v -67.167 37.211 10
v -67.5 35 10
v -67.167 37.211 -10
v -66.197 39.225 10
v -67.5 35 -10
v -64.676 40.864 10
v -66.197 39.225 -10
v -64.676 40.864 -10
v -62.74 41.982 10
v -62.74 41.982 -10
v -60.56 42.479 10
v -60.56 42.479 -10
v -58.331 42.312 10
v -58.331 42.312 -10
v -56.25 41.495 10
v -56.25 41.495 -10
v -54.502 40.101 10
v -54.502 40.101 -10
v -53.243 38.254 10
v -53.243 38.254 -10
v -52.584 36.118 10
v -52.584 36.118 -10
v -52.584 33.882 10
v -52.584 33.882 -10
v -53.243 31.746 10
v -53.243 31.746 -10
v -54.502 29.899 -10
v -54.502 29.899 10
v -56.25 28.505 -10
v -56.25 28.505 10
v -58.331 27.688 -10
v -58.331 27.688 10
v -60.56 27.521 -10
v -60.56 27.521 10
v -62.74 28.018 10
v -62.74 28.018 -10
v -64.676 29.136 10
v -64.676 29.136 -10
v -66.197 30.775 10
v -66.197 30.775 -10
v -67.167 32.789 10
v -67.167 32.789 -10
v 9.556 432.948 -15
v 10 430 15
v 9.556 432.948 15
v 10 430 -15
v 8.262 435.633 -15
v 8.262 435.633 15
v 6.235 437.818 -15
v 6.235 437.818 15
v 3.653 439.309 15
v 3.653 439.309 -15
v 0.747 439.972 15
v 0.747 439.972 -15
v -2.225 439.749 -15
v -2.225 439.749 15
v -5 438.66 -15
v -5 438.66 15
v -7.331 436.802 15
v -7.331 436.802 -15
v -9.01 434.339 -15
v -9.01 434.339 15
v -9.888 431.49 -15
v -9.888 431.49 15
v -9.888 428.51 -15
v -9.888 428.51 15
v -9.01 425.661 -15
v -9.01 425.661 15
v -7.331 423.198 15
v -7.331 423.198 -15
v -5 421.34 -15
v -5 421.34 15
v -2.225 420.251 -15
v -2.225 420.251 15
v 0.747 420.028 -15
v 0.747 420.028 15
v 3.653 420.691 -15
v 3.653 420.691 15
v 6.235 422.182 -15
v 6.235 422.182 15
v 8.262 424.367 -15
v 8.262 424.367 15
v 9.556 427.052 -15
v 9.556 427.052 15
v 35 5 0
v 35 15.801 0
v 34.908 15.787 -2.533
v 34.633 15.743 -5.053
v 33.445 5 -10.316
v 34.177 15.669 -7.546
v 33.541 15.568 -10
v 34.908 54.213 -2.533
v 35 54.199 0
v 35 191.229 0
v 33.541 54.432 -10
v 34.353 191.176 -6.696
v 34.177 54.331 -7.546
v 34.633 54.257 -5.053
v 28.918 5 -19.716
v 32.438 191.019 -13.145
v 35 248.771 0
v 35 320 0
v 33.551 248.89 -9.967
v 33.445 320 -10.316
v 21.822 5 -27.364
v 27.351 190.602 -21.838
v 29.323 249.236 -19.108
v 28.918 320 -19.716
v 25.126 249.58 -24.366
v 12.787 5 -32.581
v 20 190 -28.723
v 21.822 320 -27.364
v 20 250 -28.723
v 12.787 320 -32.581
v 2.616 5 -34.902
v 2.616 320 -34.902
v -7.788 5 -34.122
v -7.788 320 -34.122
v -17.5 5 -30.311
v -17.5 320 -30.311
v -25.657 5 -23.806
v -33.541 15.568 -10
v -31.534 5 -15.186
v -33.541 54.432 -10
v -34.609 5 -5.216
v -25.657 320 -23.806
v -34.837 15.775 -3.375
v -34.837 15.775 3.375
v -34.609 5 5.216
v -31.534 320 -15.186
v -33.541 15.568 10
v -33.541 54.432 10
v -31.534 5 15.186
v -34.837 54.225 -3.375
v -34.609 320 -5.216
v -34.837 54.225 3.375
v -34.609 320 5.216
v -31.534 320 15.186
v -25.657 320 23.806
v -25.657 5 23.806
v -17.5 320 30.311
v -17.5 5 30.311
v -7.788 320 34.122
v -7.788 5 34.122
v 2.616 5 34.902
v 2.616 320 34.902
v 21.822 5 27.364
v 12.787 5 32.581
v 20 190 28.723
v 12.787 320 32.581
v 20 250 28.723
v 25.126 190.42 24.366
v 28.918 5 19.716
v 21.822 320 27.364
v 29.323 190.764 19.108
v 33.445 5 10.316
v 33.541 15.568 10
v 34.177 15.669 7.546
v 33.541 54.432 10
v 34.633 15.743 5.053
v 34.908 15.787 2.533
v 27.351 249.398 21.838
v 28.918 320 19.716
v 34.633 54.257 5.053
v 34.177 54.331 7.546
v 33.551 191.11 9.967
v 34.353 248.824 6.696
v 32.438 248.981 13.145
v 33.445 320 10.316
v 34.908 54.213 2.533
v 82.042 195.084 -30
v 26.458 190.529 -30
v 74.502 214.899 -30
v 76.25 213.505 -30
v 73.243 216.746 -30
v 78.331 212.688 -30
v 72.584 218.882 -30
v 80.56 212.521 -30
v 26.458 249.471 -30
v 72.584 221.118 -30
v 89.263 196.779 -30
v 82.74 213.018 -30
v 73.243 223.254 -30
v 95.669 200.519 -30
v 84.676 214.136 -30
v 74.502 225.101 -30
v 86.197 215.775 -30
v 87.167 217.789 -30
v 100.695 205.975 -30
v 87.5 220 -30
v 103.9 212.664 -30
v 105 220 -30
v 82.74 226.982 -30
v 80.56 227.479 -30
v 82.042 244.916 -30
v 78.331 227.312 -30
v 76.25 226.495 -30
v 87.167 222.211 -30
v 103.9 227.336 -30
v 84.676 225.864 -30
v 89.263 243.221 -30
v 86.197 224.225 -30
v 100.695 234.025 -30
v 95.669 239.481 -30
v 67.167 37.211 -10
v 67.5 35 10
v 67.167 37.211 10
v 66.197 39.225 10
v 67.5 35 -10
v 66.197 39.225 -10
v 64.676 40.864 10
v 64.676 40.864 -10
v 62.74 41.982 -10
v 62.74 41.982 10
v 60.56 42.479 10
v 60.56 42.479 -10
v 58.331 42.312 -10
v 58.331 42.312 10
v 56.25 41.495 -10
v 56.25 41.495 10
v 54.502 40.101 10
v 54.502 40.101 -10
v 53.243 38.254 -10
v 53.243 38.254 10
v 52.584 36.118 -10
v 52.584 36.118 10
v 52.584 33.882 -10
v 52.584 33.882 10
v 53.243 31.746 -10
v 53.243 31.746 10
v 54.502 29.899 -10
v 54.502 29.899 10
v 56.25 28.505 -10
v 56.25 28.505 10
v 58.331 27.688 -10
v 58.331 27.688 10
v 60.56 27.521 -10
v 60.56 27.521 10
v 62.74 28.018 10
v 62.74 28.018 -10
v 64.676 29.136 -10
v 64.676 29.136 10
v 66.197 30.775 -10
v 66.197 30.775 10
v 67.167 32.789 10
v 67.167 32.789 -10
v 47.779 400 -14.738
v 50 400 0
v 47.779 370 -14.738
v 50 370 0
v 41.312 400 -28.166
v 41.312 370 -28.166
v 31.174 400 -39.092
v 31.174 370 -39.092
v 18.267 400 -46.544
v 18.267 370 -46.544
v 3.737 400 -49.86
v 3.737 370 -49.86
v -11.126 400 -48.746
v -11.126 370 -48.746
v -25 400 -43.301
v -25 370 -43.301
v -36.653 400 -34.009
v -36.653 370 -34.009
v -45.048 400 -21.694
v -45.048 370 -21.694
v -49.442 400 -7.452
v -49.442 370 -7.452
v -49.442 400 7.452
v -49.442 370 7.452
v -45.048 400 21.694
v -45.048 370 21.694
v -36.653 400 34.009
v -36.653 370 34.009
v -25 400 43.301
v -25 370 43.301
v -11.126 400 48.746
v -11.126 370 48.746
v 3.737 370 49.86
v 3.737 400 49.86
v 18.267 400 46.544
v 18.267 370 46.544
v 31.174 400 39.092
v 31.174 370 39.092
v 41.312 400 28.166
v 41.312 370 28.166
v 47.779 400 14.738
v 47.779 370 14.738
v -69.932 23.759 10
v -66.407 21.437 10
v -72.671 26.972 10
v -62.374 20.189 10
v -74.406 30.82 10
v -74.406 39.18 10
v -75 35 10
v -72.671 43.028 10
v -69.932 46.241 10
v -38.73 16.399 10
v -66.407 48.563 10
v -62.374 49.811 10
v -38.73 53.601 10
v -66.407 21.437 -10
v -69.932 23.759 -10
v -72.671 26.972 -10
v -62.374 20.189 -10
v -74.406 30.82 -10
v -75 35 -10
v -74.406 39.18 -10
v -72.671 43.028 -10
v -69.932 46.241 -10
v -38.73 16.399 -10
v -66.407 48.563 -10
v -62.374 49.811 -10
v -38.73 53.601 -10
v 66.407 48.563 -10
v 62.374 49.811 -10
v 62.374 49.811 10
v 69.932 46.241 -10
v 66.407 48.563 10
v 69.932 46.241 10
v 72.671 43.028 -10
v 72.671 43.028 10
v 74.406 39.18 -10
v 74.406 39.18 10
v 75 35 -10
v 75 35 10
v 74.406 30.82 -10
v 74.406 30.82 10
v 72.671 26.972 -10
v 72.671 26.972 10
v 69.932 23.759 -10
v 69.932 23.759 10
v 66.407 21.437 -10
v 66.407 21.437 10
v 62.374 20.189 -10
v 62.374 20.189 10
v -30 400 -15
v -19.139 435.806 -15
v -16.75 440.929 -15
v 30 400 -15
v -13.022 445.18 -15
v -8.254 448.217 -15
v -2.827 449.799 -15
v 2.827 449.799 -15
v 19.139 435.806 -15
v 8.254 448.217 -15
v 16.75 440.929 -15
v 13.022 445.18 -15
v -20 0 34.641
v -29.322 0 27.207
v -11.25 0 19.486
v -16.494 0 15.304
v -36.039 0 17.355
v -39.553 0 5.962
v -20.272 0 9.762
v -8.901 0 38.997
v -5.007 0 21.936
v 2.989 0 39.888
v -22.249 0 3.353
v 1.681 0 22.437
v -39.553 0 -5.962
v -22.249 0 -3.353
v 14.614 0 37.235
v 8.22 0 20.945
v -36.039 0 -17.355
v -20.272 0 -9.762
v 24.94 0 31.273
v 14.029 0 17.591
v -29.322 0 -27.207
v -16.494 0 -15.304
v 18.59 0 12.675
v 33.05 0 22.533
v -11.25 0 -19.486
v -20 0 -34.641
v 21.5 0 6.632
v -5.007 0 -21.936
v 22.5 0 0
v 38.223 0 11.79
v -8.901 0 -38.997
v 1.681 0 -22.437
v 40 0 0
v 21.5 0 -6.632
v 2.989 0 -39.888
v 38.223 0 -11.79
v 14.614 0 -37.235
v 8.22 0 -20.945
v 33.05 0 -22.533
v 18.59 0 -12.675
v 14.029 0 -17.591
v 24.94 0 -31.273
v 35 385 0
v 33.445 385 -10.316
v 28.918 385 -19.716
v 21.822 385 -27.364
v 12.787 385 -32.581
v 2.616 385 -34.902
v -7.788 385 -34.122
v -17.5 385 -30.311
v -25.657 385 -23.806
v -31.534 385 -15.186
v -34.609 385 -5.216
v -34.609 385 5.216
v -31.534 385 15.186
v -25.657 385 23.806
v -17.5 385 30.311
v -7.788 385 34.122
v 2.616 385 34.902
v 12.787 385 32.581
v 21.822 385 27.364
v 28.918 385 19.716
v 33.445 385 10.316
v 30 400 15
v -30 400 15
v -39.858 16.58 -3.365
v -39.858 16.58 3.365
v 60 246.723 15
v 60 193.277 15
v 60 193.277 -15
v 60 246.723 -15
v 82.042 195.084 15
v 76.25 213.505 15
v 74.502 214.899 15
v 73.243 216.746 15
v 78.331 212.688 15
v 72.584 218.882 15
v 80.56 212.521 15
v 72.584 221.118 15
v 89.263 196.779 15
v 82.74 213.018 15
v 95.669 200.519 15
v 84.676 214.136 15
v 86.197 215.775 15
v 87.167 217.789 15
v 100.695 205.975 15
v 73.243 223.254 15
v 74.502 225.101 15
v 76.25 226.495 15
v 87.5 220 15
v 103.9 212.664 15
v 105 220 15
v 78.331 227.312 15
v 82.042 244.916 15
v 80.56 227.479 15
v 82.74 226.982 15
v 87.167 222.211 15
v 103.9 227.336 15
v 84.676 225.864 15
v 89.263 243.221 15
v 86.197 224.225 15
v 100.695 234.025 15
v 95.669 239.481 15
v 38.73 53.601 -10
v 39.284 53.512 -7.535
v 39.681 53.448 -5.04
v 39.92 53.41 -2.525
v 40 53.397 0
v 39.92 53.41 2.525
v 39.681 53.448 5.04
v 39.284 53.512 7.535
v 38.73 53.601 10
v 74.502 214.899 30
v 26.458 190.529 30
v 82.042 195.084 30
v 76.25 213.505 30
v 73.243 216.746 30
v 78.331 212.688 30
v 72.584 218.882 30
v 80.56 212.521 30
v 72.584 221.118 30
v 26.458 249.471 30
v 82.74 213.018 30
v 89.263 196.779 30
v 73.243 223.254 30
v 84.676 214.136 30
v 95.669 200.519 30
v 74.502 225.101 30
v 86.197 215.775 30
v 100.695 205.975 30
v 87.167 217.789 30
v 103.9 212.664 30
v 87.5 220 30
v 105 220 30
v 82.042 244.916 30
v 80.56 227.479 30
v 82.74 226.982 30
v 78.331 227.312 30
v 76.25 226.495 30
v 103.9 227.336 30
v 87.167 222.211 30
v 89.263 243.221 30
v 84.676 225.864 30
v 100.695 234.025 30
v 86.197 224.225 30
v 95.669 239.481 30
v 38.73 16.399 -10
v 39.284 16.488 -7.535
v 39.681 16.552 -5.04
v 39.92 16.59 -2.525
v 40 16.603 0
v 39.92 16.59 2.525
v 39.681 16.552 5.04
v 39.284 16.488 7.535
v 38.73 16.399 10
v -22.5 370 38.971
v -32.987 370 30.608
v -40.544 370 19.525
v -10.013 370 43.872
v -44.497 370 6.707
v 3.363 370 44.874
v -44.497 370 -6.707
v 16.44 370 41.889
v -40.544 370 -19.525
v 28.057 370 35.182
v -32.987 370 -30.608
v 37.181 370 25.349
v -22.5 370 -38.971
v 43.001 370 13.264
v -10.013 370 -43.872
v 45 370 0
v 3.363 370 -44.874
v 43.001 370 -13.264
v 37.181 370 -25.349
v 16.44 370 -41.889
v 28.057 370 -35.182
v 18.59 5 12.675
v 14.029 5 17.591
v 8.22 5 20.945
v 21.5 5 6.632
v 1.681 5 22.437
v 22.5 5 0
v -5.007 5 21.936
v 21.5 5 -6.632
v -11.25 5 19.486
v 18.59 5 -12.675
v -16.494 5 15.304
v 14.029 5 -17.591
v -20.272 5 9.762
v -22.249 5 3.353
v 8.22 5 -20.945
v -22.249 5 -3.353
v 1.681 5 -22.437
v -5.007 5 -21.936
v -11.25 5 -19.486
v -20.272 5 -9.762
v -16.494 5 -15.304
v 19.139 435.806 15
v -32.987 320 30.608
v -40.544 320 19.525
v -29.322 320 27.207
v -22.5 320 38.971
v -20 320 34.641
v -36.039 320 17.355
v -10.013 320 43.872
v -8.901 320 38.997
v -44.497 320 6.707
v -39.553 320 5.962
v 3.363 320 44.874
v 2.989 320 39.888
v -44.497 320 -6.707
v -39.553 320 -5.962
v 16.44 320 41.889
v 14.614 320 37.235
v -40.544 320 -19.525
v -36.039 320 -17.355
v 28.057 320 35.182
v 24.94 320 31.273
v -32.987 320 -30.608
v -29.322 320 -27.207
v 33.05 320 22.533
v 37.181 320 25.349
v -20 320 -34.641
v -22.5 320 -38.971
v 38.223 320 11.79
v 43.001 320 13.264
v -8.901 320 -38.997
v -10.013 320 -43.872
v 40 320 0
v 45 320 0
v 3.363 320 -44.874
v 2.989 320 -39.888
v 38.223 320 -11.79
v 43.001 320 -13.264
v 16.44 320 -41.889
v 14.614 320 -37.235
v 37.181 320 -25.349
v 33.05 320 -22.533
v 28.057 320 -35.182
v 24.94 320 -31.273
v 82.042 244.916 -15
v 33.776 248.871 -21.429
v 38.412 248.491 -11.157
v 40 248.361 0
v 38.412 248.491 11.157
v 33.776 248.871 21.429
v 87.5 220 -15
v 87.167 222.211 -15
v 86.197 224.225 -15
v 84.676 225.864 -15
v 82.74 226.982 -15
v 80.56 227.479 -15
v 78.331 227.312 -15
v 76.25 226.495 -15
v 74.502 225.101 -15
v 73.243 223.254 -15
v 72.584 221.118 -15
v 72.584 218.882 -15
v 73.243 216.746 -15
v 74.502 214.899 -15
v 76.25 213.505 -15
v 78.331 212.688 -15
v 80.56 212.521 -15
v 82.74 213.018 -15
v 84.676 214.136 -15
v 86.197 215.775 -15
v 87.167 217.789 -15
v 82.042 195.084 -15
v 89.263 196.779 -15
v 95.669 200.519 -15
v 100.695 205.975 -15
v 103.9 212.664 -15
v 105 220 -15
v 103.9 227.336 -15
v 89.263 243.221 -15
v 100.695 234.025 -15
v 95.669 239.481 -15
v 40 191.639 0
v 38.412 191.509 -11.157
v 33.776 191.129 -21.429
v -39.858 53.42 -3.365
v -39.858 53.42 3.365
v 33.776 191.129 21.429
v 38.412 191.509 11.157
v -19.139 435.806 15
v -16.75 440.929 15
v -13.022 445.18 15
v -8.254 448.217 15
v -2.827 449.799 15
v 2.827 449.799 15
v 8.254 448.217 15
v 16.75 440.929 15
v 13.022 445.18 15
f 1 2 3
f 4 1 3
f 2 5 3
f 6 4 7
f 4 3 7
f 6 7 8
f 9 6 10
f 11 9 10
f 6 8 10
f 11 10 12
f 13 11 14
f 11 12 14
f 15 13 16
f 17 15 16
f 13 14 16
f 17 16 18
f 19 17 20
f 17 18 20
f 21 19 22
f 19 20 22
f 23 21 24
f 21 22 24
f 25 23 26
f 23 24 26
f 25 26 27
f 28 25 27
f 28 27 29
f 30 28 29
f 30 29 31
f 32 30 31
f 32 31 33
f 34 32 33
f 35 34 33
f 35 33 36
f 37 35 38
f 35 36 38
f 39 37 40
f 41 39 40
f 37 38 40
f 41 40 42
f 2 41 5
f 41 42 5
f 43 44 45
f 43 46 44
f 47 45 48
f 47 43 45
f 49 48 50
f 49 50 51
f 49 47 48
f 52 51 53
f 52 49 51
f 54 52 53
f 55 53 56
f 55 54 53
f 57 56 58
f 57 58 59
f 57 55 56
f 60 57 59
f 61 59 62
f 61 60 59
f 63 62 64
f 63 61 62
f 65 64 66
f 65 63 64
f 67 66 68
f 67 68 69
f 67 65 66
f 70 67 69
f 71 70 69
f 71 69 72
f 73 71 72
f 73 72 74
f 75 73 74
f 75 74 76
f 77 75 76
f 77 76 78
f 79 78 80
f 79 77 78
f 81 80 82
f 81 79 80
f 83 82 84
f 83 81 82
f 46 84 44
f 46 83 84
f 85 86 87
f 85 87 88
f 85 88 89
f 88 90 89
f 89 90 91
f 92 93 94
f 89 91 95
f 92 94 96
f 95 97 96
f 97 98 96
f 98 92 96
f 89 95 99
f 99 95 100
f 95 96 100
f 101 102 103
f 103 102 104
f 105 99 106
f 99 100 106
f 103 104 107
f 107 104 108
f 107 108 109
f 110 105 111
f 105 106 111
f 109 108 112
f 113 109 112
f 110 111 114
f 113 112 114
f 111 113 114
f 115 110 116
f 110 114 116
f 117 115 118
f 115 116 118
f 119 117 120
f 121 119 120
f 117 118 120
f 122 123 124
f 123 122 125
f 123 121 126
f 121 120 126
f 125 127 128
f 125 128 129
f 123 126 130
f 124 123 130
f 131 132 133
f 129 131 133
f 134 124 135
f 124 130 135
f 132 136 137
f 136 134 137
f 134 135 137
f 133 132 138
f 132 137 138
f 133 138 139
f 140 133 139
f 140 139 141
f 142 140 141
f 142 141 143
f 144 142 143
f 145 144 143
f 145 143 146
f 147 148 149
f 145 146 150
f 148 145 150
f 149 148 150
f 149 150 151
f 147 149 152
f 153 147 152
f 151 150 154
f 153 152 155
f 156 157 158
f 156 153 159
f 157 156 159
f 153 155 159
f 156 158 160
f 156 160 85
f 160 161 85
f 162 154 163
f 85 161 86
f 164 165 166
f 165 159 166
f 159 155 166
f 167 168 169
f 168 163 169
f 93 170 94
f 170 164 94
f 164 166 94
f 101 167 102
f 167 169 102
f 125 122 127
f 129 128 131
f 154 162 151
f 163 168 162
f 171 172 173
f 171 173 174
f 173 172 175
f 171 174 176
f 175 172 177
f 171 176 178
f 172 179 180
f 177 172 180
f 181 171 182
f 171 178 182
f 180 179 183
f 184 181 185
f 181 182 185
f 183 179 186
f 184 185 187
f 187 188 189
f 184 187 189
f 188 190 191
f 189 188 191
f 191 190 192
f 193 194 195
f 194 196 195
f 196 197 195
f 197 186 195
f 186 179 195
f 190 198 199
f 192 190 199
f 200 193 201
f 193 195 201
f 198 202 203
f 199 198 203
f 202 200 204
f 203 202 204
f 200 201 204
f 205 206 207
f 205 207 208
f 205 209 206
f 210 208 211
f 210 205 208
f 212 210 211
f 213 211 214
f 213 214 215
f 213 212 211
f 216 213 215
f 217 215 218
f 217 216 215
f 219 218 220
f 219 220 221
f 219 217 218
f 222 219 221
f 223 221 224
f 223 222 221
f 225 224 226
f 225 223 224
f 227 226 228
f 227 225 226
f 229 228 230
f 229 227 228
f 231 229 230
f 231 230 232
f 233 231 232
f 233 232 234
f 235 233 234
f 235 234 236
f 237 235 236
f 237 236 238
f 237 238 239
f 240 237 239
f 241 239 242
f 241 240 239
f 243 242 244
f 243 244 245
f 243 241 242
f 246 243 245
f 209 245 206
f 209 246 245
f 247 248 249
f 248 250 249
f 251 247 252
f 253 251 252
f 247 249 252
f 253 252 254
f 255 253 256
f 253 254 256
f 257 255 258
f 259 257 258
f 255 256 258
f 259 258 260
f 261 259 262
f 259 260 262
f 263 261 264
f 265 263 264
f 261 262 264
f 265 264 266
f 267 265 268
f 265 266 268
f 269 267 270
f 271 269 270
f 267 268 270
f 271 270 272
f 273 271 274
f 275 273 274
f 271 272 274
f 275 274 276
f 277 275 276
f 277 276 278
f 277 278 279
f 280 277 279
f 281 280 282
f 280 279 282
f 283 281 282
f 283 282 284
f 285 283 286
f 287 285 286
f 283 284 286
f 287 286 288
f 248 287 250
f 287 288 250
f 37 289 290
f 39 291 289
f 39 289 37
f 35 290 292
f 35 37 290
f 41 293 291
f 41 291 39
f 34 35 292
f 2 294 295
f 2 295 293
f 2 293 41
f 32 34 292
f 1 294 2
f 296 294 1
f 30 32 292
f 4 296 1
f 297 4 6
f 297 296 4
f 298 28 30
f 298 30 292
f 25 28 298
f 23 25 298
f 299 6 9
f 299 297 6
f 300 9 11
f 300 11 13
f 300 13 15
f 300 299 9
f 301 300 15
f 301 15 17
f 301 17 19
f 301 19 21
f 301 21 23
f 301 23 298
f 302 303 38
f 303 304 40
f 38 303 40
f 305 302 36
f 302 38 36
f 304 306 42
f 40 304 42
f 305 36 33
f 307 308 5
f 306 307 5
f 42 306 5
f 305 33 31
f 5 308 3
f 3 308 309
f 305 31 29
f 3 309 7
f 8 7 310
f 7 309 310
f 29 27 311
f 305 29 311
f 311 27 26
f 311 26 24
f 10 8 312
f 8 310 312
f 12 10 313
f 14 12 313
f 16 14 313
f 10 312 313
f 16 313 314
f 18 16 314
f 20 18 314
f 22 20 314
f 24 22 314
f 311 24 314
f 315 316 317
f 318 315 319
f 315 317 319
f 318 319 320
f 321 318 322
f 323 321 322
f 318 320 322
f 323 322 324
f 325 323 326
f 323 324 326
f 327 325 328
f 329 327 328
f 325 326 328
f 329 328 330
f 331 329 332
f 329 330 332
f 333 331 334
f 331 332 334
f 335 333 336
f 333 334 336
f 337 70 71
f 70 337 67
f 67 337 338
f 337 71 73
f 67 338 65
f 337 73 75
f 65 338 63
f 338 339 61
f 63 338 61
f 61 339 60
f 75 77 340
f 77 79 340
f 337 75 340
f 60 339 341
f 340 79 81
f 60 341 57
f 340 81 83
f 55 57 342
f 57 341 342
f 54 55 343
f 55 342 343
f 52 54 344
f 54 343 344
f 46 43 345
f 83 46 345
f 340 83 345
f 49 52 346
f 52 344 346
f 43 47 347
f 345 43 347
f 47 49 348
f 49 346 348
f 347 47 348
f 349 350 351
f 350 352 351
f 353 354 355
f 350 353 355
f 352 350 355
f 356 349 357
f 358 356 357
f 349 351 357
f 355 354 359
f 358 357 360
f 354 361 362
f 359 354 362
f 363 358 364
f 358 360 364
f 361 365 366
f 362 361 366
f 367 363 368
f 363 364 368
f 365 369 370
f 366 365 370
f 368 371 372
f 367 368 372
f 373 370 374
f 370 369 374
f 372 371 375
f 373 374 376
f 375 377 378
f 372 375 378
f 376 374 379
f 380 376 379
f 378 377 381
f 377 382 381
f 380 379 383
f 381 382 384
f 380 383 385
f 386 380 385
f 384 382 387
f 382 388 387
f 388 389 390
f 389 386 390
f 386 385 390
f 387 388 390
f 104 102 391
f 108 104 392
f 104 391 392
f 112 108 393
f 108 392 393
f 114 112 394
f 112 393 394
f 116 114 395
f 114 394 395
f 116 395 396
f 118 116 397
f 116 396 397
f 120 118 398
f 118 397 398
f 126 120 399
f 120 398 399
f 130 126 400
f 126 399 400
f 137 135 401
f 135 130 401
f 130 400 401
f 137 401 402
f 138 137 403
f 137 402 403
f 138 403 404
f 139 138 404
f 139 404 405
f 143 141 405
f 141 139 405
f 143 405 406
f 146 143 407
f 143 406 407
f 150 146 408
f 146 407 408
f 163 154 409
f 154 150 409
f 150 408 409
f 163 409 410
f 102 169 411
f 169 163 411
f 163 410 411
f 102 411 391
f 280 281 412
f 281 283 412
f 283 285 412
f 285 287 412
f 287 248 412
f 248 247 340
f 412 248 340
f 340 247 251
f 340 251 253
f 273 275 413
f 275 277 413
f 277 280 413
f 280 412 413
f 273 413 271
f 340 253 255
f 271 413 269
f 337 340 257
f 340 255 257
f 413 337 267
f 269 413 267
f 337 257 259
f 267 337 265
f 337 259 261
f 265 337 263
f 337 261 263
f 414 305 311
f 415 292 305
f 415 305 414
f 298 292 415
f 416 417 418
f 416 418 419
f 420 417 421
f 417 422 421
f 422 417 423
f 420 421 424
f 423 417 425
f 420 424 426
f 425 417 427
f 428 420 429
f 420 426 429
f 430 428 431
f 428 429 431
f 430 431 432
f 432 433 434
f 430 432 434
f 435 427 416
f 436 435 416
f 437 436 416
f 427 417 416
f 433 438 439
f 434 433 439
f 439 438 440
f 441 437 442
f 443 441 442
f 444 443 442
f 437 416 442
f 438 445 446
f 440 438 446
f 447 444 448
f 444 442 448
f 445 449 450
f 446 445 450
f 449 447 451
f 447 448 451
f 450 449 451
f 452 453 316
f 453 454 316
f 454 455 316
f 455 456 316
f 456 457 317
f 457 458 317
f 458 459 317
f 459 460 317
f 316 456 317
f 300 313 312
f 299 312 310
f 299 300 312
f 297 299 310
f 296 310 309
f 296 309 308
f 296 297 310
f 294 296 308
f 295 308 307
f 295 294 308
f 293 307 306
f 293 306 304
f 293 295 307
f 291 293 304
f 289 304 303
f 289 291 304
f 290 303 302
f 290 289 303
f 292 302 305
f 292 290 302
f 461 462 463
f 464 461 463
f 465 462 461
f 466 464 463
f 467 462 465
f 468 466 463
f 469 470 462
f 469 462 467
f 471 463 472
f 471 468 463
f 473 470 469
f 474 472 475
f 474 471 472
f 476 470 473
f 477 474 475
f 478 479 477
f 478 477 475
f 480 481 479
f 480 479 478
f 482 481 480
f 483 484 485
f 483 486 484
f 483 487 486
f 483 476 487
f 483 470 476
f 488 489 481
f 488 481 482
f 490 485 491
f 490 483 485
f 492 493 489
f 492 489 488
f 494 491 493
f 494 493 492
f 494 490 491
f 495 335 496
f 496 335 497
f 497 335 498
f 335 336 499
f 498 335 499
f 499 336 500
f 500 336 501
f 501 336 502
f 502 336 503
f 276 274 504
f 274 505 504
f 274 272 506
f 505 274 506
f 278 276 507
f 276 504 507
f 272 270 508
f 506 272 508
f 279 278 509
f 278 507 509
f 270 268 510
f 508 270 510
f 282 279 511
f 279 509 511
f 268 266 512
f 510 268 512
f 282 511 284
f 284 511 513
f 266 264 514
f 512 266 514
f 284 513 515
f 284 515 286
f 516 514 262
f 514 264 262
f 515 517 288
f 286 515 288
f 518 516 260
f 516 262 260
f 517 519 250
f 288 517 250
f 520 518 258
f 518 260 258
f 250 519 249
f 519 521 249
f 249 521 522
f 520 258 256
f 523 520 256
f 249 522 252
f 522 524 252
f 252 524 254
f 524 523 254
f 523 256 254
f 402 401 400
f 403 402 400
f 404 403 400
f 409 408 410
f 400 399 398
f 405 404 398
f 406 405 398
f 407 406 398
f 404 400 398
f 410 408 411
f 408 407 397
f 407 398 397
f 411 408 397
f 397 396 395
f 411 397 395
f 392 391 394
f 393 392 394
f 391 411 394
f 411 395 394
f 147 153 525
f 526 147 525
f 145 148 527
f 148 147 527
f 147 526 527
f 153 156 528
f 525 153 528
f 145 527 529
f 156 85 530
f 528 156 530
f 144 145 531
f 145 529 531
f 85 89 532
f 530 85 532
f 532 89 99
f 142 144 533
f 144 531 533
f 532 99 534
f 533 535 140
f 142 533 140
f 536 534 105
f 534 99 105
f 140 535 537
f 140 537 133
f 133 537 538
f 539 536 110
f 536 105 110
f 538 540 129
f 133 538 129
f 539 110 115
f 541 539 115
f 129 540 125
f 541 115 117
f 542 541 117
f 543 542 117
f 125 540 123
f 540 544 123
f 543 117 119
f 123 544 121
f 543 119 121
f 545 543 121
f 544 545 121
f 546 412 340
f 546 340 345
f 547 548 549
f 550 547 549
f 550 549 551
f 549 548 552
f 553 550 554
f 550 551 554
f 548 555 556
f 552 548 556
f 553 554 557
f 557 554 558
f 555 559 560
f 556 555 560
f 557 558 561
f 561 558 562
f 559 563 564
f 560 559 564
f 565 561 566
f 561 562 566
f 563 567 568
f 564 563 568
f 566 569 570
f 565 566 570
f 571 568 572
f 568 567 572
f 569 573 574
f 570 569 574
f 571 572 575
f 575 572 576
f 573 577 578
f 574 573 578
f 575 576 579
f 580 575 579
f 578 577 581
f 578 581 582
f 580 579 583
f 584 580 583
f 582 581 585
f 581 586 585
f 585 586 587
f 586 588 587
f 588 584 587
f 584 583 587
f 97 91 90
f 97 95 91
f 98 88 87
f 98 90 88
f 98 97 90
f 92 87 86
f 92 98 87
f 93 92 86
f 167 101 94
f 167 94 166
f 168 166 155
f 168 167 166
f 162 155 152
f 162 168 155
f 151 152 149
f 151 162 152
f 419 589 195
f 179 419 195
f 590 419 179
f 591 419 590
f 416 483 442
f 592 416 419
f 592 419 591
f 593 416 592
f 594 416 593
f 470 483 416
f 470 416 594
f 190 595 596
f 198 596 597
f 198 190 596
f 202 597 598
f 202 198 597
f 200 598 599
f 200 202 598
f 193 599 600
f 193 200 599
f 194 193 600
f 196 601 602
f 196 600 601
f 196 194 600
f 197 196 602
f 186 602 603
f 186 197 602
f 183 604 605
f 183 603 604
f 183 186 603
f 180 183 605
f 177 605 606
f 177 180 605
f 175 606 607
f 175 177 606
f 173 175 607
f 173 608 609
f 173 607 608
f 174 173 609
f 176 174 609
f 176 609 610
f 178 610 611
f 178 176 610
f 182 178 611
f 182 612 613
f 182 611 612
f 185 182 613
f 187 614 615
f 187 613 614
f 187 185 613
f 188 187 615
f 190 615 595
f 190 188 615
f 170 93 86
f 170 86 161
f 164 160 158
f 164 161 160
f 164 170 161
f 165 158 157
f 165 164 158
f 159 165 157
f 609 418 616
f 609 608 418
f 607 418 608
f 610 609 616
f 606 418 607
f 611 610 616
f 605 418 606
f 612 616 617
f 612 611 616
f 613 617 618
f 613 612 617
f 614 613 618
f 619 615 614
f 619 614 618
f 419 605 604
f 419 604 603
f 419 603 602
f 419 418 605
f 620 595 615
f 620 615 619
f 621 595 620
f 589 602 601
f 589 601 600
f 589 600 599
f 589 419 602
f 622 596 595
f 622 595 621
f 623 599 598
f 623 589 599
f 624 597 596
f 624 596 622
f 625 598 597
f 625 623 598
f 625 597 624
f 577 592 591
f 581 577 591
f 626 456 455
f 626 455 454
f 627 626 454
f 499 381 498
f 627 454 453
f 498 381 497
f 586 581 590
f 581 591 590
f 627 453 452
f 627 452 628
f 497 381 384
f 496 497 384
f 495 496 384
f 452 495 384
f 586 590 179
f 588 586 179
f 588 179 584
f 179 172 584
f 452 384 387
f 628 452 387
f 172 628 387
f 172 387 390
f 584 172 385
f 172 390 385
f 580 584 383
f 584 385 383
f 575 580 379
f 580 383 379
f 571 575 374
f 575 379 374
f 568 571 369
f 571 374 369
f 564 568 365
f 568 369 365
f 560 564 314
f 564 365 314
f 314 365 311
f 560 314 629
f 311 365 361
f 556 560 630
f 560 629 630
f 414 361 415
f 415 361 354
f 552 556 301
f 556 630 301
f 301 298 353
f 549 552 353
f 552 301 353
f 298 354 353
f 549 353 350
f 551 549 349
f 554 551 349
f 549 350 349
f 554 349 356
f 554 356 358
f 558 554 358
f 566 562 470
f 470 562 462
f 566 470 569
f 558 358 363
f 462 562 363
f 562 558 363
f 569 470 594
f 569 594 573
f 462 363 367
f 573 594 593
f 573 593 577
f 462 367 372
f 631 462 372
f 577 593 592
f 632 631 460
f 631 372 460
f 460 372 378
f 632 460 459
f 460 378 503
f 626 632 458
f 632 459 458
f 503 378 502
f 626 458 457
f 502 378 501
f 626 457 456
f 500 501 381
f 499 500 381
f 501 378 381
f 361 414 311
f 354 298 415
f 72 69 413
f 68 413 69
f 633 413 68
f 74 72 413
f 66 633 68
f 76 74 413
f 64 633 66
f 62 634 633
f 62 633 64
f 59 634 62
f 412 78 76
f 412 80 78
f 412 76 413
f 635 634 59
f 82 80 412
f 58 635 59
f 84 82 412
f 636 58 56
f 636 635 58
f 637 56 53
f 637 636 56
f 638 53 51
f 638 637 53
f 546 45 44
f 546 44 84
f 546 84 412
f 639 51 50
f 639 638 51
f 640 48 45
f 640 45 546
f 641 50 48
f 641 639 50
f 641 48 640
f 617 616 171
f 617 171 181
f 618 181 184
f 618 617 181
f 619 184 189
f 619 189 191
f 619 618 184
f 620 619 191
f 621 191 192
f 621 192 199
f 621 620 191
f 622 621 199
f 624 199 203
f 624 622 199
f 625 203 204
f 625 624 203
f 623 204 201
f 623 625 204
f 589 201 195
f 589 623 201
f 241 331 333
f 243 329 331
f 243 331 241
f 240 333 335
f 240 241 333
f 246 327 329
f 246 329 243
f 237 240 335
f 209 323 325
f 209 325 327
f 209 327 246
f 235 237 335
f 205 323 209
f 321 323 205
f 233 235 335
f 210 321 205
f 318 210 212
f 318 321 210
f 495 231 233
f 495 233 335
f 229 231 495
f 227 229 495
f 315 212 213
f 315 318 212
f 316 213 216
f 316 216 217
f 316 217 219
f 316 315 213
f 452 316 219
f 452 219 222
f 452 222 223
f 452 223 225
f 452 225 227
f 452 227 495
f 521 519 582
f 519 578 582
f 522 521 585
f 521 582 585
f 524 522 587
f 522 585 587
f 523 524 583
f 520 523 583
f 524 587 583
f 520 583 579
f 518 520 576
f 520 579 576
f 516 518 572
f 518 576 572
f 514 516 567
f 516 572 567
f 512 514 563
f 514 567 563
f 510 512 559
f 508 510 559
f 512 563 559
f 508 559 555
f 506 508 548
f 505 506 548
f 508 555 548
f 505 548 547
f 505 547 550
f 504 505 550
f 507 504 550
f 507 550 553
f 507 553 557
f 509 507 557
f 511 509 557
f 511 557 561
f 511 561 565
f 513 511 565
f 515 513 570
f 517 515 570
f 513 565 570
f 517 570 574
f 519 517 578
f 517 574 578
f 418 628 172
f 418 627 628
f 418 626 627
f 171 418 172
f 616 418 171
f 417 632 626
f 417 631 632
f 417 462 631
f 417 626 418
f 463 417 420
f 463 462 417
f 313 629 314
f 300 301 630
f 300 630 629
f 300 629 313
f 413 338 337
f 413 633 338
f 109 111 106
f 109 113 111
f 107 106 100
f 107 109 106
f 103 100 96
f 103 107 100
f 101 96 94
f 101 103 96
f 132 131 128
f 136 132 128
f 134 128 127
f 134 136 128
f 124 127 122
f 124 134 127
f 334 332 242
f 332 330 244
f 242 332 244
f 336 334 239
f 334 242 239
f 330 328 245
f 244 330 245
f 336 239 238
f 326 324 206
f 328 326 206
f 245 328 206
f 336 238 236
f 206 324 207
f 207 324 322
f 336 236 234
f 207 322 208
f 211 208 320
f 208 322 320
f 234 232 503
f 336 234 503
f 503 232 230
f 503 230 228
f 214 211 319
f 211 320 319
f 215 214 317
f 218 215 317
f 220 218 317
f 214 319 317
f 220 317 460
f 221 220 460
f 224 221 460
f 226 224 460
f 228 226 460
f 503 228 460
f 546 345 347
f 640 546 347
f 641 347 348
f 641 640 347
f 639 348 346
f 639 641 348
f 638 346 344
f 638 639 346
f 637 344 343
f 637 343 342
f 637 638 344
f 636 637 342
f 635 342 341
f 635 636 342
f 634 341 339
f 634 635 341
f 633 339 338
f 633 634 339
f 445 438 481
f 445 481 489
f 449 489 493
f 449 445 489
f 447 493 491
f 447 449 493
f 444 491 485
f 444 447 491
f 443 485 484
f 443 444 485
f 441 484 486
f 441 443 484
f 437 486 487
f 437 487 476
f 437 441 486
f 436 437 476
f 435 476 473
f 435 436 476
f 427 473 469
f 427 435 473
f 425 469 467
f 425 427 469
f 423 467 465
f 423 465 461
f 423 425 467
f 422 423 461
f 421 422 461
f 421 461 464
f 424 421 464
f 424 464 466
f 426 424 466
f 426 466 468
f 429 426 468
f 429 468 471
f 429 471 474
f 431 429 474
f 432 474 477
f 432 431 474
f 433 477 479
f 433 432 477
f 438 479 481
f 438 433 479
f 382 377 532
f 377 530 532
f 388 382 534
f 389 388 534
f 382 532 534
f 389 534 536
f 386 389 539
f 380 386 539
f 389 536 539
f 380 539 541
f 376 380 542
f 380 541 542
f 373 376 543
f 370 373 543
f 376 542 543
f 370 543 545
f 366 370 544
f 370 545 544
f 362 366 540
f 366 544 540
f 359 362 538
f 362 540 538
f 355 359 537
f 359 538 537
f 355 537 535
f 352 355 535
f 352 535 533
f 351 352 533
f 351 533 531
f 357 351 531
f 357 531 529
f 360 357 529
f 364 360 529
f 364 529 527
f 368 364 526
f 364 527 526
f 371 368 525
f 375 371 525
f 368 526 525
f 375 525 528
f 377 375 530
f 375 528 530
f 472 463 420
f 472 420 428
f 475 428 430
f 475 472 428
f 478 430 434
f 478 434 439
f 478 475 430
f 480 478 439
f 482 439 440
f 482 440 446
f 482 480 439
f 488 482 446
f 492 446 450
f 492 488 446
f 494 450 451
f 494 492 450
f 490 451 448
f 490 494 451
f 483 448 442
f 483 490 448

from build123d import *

# Parameters (mm, degrees)
SKETCH2_R           = 10
BOSS_EXTRUDE1_DEPTH = 15
SKETCH3_R           = 7.5
BOSS_EXTRUDE2_DEPTH = 10
SKETCH4_R           = 7.5
BOSS_EXTRUDE3_DEPTH = 30
SKETCH5_W           = 70
SKETCH5_H           = 80
CUT_EXTRUDE1_DEPTH  = 15
SKETCH6_W           = 35
SKETCH6_H           = 315


with BuildPart() as part:
    # Sketch1 → Revolve1 (revolve)
    with BuildSketch(Plane.XY):
        Polygon((0, 400), (50, 400), (50, 370), (45, 370), (45, 320), (40, 320), (40, 0), (22.5, 0), (22.5, 5), (35, 5), (35, 385), (0, 385), align=None)
    revolve(axis=Axis((0, -64.336492891, 0), (0, 1, 0)))

    # Sketch2 → Boss-Extrude1 (add, symmetric)
    with BuildSketch(Plane.XY):
        with BuildLine():
            Line((-30, 400), (30, 400))
            Line((30, 400), (19.138857956, 435.805524623))
            ThreePointArc((19.138857956, 435.805524623), (0, 450), (-19.138857956, 435.805524623))
            Line((-19.138857956, 435.805524623), (-30, 400))
        make_face()
        with Locations((0, 430)):
            Circle(SKETCH2_R, mode=Mode.SUBTRACT)
    extrude(amount=BOSS_EXTRUDE1_DEPTH, both=True)

    # Sketch3 → Boss-Extrude2 (add, symmetric)
    with BuildSketch(Plane.XY):
        with BuildLine():
            Line((30, 15), (30, 55))
            Line((30, 55), (62.373967528, 49.810951292))
            ThreePointArc((62.373967528, 49.810951292), (75, 35), (62.373967528, 20.189048708))
            Line((62.373967528, 20.189048708), (30, 15))
        make_face()
        with Locations((60, 35)):
            Circle(SKETCH3_R, mode=Mode.SUBTRACT)
    boss_extrude2 = extrude(amount=BOSS_EXTRUDE2_DEPTH, both=True)

    # Mirror1: Boss-Extrude2 across plane
    add(boss_extrude2.mirror(Plane(origin=(0, 0, 0), x_dir=(0, 0, 1), z_dir=(1, 0, 0))))

    # Sketch4 → Boss-Extrude3 (add, symmetric)
    with BuildSketch(Plane.XY):
        with BuildLine():
            Line((20, 250), (20, 190))
            Line((20, 190), (82.041582998, 195.08350067))
            ThreePointArc((82.041582998, 195.08350067), (105, 220), (82.041582998, 244.91649933))
            Line((82.041582998, 244.91649933), (20, 250))
        make_face()
        with Locations((80, 220)):
            Circle(SKETCH4_R, mode=Mode.SUBTRACT)
    extrude(amount=BOSS_EXTRUDE3_DEPTH, both=True)

    # Sketch5 → Cut-Extrude1 (cut, symmetric)
    with BuildSketch(Plane.XY):
        with Locations((95, 220)):
            Rectangle(SKETCH5_W, SKETCH5_H)
    extrude(amount=CUT_EXTRUDE1_DEPTH, both=True, mode=Mode.SUBTRACT)

    # Sketch6 → Cut-Revolve1 (revolve, cut)
    with BuildSketch(Plane.XY):
        with Locations((17.5, 162.5)):
            Rectangle(SKETCH6_W, SKETCH6_H)
    revolve(axis=Axis((0, 320, 0), (0, -1, 0)), mode=Mode.SUBTRACT)


solid = part.part
